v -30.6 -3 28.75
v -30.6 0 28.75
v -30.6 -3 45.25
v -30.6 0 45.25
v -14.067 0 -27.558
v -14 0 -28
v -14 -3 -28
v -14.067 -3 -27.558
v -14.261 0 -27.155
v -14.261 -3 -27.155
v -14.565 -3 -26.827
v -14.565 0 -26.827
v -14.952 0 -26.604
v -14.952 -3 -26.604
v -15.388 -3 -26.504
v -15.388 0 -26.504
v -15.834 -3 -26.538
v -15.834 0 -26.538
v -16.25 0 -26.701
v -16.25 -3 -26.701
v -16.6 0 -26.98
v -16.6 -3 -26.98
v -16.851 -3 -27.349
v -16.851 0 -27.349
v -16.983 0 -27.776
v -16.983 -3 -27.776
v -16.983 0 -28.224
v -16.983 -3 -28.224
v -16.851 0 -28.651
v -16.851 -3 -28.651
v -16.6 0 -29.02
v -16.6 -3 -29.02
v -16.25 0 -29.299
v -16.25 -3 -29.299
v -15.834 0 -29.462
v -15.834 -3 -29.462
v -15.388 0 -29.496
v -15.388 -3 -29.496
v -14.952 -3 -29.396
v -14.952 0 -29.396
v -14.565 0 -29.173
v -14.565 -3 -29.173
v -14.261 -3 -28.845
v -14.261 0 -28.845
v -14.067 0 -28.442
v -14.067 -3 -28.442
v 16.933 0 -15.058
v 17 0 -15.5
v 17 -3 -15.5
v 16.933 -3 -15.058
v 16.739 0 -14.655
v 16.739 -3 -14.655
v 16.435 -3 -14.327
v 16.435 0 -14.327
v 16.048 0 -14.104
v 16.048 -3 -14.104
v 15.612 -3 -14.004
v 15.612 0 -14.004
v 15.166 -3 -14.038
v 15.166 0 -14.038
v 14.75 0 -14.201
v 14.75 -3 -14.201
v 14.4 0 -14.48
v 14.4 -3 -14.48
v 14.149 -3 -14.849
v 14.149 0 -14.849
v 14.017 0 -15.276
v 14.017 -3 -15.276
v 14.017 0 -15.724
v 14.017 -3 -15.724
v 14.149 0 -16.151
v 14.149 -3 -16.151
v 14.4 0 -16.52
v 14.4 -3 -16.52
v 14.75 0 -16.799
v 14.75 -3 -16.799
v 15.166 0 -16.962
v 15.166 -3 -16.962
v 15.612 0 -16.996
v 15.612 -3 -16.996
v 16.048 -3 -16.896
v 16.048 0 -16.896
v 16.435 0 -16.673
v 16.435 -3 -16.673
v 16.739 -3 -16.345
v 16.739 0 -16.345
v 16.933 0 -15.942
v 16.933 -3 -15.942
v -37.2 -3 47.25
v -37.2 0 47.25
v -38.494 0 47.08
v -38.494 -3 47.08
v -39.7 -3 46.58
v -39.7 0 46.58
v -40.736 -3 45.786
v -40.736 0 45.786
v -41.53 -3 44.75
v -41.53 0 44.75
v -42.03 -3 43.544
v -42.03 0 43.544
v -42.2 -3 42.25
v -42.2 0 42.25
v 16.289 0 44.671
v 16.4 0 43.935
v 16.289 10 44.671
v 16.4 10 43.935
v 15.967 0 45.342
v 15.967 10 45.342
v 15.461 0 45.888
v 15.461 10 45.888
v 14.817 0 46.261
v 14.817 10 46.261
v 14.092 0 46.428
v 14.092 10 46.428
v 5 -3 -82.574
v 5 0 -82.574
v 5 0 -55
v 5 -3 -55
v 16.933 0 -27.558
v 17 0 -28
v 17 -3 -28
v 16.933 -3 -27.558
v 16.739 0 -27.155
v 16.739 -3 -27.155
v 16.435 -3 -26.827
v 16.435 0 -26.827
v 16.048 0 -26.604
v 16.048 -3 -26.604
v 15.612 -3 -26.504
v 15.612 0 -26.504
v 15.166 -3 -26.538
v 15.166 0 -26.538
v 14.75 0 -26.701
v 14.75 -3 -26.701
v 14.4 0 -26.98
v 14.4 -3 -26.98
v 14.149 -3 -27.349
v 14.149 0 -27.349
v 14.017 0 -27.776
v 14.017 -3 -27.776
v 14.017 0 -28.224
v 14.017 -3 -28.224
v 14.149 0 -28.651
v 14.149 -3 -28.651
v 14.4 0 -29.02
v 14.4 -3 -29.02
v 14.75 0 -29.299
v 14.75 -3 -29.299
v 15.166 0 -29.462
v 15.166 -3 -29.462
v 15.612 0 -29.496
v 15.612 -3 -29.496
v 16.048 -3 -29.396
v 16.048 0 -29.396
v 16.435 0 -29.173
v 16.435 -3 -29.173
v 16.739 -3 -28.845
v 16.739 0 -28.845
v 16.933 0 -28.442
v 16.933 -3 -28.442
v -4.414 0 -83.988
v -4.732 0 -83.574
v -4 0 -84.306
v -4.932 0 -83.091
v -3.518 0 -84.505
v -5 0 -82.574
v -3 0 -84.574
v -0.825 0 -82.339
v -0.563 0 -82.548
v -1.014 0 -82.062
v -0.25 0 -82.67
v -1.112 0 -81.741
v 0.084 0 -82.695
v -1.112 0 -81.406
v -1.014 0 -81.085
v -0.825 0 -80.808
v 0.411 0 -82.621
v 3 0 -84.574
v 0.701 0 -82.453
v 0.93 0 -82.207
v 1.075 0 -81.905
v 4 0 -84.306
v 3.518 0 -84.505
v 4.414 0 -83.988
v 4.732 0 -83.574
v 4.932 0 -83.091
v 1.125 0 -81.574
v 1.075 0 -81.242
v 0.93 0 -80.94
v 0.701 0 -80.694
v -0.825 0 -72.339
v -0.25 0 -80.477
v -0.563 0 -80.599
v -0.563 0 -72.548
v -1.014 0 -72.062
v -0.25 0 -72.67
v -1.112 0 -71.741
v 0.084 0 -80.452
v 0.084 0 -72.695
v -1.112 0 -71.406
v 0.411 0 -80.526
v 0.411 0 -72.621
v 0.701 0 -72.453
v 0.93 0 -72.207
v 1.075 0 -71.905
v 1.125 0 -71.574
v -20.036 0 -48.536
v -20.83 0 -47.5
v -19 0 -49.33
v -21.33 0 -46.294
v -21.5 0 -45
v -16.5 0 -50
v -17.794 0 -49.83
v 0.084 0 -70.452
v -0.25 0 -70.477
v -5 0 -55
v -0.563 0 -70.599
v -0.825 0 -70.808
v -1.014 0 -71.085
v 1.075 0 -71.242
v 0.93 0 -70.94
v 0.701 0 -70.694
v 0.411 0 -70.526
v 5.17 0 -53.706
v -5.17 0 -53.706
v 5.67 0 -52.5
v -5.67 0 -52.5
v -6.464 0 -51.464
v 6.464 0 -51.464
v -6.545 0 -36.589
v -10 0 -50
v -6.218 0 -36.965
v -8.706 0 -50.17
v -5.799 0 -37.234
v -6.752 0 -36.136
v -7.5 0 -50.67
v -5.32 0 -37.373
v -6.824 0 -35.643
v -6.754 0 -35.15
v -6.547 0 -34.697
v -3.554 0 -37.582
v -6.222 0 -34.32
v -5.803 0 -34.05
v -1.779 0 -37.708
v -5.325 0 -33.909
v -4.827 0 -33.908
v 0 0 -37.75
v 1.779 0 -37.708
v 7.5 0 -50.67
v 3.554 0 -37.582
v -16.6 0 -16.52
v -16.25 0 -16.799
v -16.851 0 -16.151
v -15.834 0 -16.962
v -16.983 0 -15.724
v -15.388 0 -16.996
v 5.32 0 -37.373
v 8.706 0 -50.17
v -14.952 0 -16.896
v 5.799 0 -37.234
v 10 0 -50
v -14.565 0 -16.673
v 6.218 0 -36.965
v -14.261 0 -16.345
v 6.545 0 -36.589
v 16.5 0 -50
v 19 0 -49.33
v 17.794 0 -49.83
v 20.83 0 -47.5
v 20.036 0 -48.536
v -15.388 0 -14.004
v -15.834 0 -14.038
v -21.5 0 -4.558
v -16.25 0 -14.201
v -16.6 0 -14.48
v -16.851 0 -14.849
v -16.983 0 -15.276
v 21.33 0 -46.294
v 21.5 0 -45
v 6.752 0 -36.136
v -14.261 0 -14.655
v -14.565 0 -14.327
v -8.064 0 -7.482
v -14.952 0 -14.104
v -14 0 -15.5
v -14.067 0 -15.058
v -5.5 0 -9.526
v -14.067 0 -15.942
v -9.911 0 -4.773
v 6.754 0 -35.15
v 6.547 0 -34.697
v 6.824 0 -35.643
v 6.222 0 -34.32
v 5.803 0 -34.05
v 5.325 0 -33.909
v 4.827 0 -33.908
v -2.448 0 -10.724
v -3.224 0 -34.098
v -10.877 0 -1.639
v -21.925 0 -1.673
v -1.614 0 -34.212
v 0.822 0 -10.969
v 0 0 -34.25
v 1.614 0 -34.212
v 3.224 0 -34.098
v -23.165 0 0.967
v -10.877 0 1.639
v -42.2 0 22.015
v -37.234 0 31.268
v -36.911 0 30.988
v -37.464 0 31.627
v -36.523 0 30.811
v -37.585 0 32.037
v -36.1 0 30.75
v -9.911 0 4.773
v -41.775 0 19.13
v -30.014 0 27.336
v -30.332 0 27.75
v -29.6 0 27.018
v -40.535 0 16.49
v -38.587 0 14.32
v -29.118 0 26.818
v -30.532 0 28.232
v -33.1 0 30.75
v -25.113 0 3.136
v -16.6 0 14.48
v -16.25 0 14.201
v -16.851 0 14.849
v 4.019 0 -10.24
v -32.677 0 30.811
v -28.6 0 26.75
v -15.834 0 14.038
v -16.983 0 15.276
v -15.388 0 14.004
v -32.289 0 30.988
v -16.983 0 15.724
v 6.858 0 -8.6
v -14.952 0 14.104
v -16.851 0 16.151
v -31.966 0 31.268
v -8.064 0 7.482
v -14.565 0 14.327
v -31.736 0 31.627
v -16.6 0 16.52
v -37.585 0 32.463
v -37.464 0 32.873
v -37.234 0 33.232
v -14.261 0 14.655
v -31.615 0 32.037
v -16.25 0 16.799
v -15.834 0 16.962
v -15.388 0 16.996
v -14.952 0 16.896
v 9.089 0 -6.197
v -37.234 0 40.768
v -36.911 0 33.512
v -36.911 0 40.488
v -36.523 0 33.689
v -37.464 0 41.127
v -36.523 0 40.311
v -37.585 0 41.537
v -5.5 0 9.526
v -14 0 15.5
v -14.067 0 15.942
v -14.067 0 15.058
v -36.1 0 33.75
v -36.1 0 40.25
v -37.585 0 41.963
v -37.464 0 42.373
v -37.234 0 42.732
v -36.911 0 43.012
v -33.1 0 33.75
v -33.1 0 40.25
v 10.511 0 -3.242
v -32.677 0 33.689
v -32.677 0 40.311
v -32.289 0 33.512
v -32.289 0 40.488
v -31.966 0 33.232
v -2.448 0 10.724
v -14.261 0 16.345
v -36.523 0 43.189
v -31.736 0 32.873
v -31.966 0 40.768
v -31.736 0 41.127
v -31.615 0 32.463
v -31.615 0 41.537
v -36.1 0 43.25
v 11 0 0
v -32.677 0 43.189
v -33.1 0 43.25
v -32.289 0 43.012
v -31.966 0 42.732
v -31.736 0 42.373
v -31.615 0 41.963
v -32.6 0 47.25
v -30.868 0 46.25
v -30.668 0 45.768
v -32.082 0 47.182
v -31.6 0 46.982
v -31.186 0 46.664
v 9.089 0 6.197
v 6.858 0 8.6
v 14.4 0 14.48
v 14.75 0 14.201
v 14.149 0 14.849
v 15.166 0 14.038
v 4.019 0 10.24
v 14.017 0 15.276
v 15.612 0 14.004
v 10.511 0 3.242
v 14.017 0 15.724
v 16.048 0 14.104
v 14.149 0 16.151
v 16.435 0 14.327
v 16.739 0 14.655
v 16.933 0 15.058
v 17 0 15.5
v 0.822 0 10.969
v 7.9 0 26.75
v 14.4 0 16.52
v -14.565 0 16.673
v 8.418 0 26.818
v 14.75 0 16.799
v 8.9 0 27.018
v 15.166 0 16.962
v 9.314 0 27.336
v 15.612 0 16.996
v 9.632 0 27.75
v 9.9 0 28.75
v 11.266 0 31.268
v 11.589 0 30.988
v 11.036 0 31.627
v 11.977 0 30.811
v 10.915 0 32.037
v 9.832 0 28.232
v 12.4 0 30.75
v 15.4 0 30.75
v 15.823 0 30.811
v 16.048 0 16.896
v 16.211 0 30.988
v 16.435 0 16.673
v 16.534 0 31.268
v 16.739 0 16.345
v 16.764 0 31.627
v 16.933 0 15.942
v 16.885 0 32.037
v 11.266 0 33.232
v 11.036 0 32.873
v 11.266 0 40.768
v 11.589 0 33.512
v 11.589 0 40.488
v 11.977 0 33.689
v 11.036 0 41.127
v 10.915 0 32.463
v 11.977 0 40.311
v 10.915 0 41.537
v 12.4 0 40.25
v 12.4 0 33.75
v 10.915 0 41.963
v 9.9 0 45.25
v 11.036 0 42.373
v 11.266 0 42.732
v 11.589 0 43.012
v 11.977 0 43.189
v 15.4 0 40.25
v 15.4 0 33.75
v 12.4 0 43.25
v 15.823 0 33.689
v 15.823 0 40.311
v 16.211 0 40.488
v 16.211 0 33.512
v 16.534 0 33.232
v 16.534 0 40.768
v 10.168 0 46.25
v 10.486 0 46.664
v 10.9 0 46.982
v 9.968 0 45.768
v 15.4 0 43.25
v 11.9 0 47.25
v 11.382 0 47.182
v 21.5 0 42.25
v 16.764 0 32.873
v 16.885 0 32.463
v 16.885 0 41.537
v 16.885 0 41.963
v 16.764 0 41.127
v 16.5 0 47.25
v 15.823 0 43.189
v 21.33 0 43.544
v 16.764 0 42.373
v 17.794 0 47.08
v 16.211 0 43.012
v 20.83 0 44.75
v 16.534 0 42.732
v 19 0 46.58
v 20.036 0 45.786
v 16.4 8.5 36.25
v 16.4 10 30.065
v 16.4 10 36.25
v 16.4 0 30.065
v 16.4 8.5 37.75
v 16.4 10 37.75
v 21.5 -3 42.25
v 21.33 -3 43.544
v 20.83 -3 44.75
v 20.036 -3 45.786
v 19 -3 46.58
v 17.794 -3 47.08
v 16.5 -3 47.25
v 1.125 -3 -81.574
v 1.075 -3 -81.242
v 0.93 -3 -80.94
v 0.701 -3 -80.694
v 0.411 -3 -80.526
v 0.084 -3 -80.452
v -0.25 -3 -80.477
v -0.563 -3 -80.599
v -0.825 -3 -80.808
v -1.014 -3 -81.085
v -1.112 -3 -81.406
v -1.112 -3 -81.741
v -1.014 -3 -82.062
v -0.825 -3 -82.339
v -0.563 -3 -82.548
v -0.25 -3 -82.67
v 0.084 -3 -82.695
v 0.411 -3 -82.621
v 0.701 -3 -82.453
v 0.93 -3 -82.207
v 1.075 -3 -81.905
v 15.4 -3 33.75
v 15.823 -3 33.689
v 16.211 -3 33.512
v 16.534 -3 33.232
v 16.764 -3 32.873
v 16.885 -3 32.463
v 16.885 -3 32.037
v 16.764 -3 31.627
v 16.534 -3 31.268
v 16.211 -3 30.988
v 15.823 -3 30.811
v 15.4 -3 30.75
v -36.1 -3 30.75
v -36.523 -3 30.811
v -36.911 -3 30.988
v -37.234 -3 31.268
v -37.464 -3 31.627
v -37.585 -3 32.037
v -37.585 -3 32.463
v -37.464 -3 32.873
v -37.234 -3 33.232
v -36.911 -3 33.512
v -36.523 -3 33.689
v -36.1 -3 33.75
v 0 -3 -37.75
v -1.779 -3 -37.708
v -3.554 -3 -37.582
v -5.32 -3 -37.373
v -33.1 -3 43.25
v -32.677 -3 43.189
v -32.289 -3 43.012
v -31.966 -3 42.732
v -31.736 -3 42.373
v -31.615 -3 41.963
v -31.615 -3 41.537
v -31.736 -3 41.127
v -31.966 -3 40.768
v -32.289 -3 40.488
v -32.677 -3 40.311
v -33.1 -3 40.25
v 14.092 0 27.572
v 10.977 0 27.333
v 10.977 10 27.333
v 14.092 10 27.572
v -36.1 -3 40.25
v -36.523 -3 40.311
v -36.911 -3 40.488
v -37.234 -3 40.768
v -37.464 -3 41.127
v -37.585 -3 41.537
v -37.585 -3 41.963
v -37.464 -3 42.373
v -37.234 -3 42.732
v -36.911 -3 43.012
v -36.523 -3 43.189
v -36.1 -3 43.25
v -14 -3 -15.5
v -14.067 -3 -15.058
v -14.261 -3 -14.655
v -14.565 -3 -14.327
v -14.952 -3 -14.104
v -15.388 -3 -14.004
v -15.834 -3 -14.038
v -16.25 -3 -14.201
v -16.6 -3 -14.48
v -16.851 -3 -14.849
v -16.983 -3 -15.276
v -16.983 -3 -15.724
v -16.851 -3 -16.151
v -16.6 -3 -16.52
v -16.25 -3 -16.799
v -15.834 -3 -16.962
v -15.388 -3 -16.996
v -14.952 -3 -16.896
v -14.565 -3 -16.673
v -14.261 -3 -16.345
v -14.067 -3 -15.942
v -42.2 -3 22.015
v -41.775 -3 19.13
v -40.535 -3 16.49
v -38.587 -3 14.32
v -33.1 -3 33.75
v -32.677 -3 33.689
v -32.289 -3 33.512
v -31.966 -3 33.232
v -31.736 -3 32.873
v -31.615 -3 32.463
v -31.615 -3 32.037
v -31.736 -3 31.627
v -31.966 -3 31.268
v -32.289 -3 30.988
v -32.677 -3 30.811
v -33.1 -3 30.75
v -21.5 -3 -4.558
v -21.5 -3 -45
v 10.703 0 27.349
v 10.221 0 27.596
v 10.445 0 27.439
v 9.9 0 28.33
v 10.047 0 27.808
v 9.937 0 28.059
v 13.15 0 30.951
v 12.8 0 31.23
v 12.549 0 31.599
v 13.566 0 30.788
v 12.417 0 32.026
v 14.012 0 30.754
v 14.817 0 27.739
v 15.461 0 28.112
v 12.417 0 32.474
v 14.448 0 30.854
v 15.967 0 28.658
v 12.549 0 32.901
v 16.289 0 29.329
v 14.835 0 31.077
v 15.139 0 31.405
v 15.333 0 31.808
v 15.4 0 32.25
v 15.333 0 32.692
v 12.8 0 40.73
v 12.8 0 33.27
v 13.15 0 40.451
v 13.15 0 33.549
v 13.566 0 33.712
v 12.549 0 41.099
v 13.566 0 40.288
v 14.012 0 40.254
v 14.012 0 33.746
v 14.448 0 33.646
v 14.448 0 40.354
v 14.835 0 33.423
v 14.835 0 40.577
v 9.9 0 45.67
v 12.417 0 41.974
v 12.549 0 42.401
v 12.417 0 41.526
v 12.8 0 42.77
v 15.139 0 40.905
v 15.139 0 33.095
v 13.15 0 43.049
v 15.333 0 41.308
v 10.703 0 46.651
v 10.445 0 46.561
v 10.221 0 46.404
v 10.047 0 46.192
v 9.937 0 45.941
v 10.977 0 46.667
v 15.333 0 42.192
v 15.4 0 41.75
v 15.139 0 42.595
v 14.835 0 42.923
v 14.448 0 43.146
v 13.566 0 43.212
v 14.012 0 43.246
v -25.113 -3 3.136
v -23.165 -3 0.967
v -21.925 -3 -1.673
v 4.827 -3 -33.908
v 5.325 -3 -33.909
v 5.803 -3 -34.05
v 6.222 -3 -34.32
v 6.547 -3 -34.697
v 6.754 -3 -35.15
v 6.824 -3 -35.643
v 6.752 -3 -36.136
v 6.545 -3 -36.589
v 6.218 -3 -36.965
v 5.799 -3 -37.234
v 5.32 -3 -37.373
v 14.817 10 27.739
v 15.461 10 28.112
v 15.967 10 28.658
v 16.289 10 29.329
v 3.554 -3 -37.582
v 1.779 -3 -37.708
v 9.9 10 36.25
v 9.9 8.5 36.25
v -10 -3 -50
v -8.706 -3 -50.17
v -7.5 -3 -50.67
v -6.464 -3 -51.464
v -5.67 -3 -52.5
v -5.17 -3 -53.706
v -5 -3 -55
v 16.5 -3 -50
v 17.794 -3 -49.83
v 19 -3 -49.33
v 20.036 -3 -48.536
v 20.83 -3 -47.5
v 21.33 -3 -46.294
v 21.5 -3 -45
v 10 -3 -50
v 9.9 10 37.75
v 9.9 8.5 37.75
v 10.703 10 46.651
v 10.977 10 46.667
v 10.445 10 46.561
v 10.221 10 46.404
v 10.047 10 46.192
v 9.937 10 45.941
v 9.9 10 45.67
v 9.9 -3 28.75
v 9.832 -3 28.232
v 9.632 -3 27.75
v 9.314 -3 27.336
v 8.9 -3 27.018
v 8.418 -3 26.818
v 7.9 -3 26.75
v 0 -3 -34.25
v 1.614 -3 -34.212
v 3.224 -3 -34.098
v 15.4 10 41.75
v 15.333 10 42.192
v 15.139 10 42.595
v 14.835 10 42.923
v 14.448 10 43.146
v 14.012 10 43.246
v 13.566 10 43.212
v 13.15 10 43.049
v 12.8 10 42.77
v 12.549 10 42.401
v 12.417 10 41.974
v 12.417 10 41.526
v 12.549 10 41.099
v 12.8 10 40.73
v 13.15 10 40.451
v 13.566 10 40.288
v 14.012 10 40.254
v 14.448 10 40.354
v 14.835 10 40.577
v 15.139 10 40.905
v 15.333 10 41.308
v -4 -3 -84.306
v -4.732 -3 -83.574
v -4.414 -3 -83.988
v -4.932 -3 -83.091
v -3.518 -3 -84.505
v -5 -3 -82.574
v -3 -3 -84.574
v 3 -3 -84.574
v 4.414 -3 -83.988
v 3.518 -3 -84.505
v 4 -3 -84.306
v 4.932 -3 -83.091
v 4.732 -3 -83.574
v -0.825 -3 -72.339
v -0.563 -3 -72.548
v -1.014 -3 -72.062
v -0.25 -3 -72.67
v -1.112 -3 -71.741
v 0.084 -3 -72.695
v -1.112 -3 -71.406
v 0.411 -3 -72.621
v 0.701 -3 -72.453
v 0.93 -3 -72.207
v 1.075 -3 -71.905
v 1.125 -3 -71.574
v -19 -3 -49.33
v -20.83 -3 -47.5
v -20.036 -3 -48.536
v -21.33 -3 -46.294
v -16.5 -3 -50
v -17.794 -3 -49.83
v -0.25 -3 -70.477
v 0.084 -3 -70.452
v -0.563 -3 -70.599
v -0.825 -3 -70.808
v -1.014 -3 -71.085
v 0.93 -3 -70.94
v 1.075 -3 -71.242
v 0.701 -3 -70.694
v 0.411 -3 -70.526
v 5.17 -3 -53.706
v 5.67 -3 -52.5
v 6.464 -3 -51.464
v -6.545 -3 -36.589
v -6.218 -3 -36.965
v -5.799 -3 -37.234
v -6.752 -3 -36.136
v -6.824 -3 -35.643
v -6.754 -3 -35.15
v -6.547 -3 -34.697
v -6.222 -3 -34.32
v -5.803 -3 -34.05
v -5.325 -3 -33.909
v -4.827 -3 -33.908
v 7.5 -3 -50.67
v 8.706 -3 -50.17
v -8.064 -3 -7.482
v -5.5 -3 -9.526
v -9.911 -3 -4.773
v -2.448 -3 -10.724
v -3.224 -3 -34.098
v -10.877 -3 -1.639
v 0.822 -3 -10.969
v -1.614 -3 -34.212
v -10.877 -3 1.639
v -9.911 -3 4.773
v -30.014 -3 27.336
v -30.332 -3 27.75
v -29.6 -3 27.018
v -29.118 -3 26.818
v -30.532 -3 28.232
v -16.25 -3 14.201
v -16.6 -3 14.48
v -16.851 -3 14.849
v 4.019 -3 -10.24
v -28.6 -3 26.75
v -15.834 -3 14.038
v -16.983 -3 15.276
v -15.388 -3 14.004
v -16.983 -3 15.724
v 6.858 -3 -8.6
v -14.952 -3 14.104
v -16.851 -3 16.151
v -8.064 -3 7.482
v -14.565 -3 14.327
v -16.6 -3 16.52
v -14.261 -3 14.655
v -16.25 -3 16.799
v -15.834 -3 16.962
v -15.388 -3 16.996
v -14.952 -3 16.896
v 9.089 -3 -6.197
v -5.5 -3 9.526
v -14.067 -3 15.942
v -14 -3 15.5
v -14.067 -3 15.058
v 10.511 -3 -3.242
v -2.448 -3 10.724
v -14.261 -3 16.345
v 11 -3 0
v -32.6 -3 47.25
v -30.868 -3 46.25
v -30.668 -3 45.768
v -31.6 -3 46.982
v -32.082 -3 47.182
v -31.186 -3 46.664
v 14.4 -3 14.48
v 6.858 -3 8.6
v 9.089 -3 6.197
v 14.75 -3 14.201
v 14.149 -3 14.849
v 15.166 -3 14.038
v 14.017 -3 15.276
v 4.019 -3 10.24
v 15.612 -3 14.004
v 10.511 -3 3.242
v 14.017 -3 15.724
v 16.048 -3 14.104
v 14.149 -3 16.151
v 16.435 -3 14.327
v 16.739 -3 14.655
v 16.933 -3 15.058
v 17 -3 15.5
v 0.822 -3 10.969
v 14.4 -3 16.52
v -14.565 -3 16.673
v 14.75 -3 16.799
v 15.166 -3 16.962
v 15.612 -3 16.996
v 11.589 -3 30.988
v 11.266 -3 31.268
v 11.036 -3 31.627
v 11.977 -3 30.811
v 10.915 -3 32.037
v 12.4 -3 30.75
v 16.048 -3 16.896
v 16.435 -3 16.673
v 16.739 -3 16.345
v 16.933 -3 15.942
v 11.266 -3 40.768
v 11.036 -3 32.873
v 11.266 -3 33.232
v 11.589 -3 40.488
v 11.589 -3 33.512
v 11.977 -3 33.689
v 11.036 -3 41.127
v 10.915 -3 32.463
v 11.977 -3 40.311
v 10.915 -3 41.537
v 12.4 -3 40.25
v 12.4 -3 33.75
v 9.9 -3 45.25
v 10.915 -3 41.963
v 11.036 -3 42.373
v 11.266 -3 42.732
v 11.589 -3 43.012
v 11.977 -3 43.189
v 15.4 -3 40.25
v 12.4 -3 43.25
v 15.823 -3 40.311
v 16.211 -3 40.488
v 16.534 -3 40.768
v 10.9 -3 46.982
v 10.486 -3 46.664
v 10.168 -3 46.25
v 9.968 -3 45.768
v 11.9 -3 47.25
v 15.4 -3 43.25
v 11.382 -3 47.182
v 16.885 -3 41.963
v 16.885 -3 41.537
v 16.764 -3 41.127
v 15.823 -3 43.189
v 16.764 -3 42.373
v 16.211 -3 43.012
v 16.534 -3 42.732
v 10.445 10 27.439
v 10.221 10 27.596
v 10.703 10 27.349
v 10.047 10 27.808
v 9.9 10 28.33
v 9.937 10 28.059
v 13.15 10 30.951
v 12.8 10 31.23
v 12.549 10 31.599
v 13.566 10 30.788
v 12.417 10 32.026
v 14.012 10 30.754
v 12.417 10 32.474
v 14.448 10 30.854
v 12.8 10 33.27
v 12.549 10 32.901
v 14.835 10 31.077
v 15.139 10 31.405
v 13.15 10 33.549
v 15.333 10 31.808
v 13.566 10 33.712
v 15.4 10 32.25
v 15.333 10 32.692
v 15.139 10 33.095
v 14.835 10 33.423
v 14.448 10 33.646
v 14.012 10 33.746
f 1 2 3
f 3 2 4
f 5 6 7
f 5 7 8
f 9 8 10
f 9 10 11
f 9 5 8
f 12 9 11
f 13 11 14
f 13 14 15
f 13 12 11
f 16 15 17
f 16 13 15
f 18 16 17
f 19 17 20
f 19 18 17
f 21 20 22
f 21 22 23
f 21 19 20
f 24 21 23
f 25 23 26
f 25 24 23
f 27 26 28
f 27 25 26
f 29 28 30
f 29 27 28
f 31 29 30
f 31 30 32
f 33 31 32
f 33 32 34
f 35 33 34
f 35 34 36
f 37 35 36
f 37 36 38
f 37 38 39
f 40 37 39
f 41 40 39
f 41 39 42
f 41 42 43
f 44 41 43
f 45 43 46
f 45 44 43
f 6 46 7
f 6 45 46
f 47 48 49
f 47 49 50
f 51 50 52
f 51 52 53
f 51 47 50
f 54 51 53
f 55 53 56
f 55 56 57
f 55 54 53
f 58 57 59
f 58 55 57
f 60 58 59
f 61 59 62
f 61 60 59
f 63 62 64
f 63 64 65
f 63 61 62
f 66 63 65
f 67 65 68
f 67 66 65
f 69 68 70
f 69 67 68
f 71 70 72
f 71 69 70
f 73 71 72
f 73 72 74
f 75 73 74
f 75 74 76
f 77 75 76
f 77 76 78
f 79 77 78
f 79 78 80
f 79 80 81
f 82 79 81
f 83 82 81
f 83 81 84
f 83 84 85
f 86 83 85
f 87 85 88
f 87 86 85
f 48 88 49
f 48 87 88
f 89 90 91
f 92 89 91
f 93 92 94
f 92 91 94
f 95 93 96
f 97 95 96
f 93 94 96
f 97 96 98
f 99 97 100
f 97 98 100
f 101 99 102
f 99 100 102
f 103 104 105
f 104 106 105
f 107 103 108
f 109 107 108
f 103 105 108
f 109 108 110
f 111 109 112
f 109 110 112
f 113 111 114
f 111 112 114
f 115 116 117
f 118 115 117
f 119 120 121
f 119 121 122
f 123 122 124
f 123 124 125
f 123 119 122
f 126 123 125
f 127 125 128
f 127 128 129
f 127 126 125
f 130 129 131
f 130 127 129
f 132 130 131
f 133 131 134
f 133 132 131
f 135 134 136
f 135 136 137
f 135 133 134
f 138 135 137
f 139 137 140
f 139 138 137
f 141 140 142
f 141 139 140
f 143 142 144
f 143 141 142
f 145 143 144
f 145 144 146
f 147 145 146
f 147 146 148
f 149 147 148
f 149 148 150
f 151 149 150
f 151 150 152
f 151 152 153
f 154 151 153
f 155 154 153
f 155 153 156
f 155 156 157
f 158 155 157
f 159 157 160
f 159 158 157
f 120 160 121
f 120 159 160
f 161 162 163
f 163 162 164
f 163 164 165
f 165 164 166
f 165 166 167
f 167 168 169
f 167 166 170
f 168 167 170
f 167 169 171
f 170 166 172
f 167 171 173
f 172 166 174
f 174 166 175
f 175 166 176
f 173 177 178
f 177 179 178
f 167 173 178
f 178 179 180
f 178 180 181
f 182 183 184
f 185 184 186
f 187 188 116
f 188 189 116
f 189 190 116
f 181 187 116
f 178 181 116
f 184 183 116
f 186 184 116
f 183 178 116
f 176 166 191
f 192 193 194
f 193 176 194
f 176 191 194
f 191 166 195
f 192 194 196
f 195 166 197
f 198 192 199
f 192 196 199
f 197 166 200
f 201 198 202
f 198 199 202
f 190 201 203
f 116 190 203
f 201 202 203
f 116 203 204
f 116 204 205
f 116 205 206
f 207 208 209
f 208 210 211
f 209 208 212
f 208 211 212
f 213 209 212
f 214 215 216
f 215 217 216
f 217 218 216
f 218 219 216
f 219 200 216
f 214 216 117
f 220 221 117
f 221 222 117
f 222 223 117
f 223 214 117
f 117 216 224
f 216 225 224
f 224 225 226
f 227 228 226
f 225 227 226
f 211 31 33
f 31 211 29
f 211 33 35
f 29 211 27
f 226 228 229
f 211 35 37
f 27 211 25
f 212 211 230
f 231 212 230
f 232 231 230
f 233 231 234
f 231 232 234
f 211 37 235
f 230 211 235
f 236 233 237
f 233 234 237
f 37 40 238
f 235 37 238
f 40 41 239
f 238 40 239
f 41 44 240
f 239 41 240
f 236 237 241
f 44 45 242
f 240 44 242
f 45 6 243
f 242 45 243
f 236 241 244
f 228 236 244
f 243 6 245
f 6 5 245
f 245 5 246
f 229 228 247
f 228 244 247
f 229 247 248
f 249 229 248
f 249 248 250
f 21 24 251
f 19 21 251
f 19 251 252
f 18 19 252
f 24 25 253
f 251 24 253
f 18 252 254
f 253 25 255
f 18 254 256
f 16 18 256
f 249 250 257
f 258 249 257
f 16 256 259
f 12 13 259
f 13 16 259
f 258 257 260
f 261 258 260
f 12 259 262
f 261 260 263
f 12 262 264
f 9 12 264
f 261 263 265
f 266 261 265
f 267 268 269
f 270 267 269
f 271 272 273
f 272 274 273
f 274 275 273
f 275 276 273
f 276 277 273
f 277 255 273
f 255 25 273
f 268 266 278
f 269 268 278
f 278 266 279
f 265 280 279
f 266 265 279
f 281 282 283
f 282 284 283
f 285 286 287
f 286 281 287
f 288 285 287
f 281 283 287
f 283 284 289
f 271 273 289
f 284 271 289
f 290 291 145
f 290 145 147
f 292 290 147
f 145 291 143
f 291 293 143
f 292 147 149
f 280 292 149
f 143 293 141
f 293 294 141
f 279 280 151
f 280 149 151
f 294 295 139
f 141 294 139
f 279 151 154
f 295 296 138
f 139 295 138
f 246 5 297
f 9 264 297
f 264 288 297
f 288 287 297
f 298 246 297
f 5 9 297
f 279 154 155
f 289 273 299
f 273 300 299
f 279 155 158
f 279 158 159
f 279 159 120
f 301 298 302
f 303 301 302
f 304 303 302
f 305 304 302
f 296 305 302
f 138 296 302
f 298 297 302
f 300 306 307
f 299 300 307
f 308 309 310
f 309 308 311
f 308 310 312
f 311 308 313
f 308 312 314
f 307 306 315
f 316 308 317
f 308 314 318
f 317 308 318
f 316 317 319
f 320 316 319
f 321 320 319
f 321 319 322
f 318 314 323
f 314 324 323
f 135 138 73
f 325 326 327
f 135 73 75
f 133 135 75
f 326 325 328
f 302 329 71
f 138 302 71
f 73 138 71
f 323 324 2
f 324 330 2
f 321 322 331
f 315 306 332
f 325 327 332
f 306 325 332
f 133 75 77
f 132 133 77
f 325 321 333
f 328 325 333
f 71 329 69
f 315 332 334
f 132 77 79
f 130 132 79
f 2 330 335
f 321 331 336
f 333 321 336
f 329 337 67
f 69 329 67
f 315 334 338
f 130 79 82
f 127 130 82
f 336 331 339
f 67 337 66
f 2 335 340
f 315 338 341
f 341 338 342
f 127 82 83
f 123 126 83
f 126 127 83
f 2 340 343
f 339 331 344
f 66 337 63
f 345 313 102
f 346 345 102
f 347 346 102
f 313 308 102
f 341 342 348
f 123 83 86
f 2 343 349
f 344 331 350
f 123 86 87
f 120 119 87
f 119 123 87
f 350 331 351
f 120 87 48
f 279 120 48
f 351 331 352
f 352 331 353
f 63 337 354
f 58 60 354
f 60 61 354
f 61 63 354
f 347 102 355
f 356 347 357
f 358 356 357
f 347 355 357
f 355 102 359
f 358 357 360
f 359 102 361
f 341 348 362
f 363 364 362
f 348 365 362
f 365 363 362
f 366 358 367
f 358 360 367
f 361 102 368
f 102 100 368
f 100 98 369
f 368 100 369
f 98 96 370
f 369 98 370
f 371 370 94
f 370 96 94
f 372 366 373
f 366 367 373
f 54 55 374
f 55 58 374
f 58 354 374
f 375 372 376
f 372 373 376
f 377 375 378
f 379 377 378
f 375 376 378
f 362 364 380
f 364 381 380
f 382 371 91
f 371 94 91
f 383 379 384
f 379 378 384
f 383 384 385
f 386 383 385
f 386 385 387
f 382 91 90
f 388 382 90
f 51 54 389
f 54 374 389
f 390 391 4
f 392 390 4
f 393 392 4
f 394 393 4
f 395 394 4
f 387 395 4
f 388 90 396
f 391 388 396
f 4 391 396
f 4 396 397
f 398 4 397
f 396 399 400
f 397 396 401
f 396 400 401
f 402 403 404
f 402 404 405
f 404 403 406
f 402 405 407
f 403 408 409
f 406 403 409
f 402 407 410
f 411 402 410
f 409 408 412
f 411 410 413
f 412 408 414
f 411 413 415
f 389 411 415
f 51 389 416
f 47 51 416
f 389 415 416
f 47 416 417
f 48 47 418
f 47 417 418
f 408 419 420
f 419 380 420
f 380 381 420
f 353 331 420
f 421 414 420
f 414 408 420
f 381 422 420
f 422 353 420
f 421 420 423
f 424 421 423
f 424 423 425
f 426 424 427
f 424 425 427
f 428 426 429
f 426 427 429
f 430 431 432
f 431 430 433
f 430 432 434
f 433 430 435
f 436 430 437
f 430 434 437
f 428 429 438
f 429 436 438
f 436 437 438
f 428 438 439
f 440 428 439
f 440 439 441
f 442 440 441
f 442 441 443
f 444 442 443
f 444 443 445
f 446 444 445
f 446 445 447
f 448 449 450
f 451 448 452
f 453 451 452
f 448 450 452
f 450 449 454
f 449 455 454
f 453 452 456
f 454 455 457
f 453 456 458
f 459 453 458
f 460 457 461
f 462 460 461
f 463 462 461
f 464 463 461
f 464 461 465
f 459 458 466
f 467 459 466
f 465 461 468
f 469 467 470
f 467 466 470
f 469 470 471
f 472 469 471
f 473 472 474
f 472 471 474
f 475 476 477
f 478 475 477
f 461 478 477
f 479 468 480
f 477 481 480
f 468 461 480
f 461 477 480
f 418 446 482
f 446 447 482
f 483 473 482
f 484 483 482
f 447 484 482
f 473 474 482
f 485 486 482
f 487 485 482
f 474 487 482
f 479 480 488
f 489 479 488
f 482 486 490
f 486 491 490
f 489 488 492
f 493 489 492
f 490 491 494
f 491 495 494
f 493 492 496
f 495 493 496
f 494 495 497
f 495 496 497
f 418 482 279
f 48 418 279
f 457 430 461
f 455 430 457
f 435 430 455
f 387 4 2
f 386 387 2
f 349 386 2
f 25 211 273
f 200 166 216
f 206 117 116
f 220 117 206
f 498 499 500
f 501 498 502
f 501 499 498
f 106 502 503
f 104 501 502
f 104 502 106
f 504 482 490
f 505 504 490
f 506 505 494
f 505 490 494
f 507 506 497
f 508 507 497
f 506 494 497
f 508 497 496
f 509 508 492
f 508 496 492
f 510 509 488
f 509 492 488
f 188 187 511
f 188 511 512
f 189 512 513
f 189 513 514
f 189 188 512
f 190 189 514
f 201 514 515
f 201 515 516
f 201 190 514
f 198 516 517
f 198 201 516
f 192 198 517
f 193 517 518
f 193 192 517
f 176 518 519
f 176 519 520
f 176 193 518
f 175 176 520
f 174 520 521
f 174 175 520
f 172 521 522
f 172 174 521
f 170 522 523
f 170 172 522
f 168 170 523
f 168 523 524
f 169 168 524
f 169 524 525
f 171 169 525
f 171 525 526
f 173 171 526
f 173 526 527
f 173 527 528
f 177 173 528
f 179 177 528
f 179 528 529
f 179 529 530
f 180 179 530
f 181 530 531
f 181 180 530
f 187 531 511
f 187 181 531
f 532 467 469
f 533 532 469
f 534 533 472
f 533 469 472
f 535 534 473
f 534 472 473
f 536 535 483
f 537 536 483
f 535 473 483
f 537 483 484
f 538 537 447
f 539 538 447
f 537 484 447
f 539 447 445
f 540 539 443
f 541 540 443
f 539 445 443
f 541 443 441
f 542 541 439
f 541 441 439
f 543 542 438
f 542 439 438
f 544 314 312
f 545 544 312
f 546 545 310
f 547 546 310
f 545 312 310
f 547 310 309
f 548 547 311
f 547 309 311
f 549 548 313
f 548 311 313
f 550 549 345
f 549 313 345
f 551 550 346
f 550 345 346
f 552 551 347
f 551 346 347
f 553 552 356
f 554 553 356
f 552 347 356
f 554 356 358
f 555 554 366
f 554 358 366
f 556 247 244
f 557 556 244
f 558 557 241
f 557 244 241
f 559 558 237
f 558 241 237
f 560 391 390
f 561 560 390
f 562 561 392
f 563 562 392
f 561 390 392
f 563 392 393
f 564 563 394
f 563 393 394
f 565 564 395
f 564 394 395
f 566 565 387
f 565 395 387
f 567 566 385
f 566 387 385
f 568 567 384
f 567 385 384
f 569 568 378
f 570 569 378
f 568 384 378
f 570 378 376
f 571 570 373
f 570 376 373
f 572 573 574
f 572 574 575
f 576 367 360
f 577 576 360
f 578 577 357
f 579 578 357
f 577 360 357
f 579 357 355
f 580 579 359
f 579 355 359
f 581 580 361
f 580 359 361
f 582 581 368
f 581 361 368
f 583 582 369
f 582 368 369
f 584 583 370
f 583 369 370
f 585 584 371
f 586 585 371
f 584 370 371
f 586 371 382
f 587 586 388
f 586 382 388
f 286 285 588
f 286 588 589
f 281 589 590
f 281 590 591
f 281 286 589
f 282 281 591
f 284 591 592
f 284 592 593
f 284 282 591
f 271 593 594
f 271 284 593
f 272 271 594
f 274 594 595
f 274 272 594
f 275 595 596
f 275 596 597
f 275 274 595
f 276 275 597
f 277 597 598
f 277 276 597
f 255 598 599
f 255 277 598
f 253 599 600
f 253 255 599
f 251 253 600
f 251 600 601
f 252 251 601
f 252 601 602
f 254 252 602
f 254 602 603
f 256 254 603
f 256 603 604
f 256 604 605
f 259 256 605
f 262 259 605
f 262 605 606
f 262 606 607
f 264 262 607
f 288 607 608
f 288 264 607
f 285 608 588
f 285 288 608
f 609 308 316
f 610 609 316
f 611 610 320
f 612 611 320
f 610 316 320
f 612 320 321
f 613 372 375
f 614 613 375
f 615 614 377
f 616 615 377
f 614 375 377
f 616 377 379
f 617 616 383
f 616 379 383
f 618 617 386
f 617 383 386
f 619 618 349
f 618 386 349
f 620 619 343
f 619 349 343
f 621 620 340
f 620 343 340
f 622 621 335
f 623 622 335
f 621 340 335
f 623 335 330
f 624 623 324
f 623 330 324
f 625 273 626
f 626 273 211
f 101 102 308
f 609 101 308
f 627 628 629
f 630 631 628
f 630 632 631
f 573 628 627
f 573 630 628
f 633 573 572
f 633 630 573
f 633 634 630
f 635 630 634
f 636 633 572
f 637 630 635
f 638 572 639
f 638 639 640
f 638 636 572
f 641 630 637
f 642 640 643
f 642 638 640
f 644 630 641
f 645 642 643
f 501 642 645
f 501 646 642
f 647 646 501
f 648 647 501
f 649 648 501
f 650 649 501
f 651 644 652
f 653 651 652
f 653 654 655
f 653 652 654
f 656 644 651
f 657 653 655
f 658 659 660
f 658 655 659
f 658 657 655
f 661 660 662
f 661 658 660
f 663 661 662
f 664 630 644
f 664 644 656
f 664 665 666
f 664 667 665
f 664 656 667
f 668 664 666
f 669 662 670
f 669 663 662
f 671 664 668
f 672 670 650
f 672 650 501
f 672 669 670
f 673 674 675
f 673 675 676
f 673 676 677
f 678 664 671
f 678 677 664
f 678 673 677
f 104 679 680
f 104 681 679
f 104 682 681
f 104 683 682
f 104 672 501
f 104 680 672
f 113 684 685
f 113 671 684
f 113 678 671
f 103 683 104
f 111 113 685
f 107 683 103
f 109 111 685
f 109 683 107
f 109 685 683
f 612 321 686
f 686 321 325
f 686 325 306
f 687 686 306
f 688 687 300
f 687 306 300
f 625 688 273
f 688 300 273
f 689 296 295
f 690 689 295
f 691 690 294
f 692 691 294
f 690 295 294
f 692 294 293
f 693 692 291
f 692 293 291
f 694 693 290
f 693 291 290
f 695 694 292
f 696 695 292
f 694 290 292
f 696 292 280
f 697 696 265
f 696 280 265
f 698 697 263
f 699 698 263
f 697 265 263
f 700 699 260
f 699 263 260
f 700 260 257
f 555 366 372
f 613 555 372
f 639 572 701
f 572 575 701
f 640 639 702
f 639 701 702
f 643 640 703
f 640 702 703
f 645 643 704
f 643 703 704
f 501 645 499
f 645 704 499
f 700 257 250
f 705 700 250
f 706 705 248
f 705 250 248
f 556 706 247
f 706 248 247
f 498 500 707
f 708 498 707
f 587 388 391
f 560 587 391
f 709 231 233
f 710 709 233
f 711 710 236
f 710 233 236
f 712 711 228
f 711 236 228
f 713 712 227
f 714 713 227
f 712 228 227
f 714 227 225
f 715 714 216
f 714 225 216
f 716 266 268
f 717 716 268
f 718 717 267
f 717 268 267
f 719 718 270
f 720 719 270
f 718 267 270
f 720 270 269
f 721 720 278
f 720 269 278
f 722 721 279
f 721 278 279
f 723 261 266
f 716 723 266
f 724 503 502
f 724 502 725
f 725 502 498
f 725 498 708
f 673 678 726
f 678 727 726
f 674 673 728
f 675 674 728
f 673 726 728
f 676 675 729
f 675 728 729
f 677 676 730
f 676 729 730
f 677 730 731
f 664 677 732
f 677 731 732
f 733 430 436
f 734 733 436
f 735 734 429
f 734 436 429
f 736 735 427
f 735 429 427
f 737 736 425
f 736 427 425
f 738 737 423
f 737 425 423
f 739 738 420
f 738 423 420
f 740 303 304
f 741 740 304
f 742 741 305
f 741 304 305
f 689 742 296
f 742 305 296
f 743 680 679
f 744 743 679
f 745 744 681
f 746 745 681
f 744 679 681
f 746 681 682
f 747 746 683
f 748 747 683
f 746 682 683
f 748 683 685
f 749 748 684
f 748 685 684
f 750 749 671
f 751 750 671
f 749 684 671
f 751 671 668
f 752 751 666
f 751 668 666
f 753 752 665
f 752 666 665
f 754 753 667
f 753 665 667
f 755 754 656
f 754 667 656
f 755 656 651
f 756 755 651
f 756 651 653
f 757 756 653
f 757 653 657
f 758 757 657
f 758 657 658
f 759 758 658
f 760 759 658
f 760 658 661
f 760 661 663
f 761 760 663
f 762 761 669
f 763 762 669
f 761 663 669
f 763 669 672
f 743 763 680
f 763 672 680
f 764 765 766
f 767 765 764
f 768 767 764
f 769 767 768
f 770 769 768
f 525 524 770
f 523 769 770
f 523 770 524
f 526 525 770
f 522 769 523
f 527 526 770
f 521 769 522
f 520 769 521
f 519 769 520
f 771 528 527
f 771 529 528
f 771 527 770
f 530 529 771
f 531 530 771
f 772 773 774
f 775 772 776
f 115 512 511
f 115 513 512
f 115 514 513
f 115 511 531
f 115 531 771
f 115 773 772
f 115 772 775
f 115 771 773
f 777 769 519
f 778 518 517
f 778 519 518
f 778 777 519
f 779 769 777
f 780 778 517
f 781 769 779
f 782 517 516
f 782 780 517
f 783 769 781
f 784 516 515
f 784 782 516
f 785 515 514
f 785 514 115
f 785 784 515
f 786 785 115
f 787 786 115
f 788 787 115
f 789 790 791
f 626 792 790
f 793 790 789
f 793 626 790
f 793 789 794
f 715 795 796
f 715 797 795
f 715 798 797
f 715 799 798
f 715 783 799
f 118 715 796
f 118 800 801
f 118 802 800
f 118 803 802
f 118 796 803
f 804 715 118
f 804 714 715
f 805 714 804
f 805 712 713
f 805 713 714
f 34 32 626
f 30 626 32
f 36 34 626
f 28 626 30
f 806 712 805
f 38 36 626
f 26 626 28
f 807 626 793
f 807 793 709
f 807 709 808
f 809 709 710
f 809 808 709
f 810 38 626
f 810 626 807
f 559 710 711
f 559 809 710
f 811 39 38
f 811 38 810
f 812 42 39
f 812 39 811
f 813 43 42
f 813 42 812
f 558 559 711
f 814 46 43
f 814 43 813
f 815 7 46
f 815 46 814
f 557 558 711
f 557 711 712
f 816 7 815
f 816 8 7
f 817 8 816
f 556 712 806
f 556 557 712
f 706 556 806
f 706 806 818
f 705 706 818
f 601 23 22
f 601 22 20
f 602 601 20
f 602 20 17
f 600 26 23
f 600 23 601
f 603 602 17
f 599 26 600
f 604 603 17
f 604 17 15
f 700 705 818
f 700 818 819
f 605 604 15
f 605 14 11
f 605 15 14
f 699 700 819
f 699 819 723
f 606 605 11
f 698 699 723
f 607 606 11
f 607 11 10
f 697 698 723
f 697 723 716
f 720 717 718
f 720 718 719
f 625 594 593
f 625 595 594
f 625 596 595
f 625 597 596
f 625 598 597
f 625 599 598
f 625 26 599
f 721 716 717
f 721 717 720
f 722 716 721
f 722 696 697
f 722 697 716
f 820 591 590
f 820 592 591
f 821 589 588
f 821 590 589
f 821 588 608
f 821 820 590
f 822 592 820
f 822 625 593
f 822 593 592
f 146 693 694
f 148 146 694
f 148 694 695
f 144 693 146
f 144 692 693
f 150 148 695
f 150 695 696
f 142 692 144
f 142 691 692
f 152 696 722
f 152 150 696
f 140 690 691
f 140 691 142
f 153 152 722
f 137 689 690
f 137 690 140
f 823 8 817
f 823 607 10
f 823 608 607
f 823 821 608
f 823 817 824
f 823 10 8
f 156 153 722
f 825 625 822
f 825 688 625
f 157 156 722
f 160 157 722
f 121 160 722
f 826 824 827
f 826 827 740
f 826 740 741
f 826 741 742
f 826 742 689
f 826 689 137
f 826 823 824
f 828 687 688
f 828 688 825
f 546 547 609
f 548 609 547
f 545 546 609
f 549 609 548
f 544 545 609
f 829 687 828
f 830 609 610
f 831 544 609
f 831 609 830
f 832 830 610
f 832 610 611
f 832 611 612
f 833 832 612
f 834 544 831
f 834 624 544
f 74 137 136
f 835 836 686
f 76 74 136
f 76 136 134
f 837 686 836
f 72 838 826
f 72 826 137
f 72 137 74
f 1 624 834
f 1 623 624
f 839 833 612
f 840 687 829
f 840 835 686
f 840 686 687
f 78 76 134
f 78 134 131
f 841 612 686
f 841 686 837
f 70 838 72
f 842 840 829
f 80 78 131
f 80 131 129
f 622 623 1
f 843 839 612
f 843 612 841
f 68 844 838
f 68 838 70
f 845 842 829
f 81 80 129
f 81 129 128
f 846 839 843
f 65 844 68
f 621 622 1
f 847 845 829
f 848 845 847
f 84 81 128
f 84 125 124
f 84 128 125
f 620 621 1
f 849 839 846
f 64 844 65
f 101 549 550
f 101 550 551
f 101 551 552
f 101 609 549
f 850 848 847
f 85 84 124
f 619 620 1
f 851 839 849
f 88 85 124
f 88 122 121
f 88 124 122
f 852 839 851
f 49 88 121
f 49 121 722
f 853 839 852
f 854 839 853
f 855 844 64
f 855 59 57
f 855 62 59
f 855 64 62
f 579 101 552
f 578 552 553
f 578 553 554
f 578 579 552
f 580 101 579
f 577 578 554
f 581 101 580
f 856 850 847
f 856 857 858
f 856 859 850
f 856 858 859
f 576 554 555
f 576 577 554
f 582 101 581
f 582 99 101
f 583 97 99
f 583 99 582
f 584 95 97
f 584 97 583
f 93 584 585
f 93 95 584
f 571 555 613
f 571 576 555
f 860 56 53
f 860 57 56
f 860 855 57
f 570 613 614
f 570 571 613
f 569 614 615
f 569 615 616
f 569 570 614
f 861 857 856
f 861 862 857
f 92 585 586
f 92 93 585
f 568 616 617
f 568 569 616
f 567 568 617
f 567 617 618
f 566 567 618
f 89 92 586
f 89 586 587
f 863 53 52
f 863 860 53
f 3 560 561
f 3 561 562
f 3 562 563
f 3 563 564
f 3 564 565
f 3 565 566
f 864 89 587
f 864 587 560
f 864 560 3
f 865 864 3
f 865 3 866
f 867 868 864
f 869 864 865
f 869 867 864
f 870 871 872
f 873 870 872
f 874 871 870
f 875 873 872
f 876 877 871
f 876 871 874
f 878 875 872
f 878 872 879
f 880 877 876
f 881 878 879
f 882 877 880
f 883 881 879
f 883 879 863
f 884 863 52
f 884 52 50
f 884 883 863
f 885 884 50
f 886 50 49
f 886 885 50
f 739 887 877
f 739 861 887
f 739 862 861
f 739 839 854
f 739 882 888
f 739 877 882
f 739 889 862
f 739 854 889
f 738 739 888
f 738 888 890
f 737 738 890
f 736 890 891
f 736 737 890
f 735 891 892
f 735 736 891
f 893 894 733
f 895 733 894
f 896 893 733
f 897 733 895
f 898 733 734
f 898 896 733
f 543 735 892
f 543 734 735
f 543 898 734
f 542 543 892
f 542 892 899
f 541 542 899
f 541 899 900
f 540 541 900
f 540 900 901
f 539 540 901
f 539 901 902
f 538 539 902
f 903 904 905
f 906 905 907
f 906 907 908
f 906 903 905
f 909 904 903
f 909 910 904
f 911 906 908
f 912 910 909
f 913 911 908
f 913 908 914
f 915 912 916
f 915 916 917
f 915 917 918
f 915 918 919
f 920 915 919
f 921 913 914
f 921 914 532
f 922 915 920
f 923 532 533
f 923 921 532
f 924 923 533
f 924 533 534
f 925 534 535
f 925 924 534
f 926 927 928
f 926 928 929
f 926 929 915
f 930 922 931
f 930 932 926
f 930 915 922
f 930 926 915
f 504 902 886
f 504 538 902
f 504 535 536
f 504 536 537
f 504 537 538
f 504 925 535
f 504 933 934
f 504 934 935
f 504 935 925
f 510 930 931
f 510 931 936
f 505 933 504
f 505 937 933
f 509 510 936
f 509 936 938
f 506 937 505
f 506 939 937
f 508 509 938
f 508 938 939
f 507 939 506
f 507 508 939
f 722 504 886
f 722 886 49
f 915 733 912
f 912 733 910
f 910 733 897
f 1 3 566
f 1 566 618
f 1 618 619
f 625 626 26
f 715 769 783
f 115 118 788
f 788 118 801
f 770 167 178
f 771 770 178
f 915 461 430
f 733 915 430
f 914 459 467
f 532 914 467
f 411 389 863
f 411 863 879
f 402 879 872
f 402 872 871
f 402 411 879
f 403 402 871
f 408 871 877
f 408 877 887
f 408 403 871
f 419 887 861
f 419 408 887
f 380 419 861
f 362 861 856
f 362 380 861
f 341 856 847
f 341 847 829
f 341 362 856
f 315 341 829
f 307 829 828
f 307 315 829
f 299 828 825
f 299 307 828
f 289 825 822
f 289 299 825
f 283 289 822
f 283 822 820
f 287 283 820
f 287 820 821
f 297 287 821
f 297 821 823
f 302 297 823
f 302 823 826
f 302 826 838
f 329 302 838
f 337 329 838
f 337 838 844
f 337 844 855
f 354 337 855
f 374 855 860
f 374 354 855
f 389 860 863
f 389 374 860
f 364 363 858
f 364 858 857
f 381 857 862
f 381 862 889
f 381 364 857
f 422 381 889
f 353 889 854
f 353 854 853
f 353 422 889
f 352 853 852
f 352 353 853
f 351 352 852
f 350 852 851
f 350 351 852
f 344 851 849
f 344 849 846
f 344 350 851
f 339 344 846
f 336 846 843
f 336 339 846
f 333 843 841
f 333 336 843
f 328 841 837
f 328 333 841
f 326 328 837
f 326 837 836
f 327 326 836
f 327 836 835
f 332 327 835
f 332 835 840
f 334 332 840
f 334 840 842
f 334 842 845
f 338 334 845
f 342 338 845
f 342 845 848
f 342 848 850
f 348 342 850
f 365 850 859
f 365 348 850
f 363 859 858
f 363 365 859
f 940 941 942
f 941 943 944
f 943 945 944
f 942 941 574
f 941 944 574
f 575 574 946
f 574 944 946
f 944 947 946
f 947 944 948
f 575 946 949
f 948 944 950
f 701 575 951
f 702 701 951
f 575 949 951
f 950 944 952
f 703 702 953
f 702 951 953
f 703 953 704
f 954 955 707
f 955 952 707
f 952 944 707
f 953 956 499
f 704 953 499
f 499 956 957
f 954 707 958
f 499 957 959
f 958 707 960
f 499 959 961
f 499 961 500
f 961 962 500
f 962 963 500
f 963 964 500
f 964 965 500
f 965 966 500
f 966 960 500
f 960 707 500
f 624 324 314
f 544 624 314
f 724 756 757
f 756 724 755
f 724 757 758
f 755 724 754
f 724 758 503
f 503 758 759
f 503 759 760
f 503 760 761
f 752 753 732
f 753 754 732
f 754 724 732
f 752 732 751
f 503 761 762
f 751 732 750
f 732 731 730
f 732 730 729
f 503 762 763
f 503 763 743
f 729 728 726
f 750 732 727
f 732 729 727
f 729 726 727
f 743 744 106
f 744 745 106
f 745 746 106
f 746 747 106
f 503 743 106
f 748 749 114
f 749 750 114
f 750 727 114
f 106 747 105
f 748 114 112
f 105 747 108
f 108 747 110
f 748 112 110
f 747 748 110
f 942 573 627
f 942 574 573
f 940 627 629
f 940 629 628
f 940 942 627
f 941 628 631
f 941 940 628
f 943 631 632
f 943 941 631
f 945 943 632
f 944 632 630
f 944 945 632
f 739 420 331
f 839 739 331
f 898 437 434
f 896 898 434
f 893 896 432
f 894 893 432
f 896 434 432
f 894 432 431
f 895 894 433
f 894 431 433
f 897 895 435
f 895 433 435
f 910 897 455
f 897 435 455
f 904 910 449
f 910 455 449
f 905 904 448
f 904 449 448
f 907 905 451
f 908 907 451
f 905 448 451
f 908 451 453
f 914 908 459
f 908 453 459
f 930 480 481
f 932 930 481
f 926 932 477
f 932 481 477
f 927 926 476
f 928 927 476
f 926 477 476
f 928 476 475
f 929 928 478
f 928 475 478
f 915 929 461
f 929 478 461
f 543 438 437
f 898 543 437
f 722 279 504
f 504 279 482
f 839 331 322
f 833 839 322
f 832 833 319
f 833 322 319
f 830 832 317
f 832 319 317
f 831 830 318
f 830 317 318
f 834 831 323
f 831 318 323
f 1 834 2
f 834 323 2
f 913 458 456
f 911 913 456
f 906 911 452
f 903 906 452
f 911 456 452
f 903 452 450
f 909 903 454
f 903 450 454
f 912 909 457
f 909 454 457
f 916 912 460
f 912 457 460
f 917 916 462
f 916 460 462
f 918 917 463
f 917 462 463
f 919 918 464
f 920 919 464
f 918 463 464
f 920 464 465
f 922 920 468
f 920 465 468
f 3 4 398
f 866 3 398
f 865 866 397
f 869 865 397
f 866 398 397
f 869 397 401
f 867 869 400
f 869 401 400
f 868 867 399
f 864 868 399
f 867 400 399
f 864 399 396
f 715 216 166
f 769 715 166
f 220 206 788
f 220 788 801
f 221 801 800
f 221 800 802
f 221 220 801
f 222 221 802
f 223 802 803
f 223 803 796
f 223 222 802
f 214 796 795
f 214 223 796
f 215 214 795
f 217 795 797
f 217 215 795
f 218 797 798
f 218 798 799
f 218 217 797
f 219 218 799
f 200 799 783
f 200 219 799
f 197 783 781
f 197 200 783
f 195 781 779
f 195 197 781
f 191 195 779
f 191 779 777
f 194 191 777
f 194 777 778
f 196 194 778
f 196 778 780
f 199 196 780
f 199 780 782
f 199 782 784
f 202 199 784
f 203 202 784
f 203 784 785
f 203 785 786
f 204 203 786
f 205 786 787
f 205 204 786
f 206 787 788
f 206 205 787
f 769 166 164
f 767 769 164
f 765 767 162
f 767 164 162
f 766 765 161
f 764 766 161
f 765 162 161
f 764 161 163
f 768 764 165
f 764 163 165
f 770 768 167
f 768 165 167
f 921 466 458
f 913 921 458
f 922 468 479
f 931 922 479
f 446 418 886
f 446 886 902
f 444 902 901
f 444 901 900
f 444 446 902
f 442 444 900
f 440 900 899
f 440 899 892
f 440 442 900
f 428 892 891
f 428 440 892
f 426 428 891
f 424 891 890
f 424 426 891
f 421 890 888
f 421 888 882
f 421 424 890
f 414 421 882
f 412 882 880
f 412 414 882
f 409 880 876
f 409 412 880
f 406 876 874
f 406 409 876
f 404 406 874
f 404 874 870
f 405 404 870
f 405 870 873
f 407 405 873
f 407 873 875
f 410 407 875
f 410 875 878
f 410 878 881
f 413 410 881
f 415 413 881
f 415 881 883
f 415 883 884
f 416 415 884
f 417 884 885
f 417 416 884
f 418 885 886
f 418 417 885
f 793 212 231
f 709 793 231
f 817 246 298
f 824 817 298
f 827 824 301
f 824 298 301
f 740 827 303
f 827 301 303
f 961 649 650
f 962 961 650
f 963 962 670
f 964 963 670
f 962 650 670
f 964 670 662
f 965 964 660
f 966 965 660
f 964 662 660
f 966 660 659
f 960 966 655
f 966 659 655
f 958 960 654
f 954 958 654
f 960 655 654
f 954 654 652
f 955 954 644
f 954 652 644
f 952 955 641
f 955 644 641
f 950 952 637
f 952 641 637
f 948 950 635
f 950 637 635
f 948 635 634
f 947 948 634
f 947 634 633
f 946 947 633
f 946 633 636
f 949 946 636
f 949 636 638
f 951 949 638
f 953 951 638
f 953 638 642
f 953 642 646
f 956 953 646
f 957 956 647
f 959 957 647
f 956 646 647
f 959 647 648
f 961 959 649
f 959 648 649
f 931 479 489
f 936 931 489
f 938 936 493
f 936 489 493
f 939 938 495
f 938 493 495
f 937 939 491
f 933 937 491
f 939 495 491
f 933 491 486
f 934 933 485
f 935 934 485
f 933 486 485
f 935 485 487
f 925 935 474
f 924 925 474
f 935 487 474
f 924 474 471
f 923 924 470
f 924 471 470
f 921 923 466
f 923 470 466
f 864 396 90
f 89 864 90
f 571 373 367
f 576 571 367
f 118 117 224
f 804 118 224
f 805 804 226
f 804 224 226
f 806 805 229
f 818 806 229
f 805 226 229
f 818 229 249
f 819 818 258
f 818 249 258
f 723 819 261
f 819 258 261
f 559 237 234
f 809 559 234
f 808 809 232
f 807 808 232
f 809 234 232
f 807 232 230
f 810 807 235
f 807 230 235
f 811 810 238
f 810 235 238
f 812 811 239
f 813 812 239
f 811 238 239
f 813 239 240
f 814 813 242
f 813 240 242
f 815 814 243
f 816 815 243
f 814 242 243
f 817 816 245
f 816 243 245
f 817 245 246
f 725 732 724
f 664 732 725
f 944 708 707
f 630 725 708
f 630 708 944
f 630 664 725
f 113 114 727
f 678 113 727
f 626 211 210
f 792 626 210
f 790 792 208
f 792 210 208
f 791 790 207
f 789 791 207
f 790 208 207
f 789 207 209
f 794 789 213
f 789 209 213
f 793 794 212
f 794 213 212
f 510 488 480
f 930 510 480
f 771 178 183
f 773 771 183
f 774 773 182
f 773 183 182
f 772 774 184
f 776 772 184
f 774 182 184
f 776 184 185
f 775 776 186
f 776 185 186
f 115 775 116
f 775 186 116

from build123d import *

# Parameters (mm, degrees)
F1_R     = 1.5
F1_R_2   = 1.125
F1_R_3   = 11
F2_DEPTH = 3
F3_R     = 1.5
F4_DEPTH = 10
F5_W     = 6.5
F5_H     = 1.5
F6_DEPTH = 1.5
F7_R     = 1
F8_R     = 2.5


with BuildPart() as f2:
    # F1 (on Front) → F2 (new body)
    with BuildSketch(Plane.XZ):
        with BuildLine():
            ThreePointArc((16.5, -50), (20.035534, -48.535534), (21.5, -45))
            Line((21.5, -45), (21.5, 42.25))
            ThreePointArc((21.5, 42.25), (20.035534, 45.785534), (16.5, 47.25))
            Line((16.5, 47.25), (11.9, 47.25))
            ThreePointArc((11.9, 47.25), (10.485786, 46.664214), (9.9, 45.25))
            Line((9.9, 45.25), (9.9, 28.75))
            ThreePointArc((9.9, 28.75), (9.314214, 27.335786), (7.9, 26.75))
            Line((7.9, 26.75), (-28.6, 26.75))
            ThreePointArc((-28.6, 26.75), (-30.014214, 27.335786), (-30.6, 28.75))
            Line((-30.6, 28.75), (-30.6, 45.25))
            ThreePointArc((-30.6, 45.25), (-31.185786, 46.664214), (-32.6, 47.25))
            Line((-32.6, 47.25), (-37.2, 47.25))
            ThreePointArc((-37.2, 47.25), (-40.735534, 45.785534), (-42.2, 42.25))
            Line((-42.2, 42.25), (-42.2, 22.015033))
            ThreePointArc((-42.2, 22.015033), (-41.251777, 17.7647), (-38.586933, 14.320419))
            Line((-38.586933, 14.320419), (-25.113067, 3.136405))
            ThreePointArc((-25.113067, 3.136405), (-22.448223, -0.307876), (-21.5, -4.558209))
            Line((-21.5, -4.558209), (-21.5, -45))
            ThreePointArc((-21.5, -45), (-20.035534, -48.535534), (-16.5, -50))
            Line((-16.5, -50), (-10, -50))
            ThreePointArc((-10, -50), (-6.464466, -51.464466), (-5, -55))
            Line((-5, -55), (-5, -82.573619))
            ThreePointArc((-5, -82.573619), (-4.414214, -83.987833), (-3, -84.573619))
            Line((-3, -84.573619), (3, -84.573619))
            ThreePointArc((3, -84.573619), (4.414214, -83.987833), (5, -82.573619))
            Line((5, -82.573619), (5, -55))
            ThreePointArc((5, -55), (6.464466, -51.464466), (10, -50))
            Line((10, -50), (16.5, -50))
        make_face()
        with Locations((-15.5, -28)):
            Circle(F1_R, mode=Mode.SUBTRACT)
        with Locations((0, -81.573619)):
            Circle(F1_R_2, mode=Mode.SUBTRACT)
        with Locations((0, -71.573619)):
            Circle(F1_R_2, mode=Mode.SUBTRACT)
        with BuildLine():
            ThreePointArc((0, -34.25), (2.419604, -34.164426), (4.827117, -33.908132))
            ThreePointArc((4.827117, -33.908132), (6.80629, -35.394024), (5.320399, -37.373197))
            ThreePointArc((5.320399, -37.373197), (2.666863, -37.655681), (0, -37.75))
            ThreePointArc((0, -37.75), (-2.666863, -37.655681), (-5.320399, -37.373197))
            ThreePointArc((-5.320399, -37.373197), (-6.80629, -35.394024), (-4.827117, -33.908132))
            ThreePointArc((-4.827117, -33.908132), (-2.419604, -34.164426), (0, -34.25))
        make_face(mode=Mode.SUBTRACT)
        with Locations((15.5, -28)):
            Circle(F1_R, mode=Mode.SUBTRACT)
        with Locations((-15.5, -15.5)):
            Circle(F1_R, mode=Mode.SUBTRACT)
        with BuildLine():
            ThreePointArc((-36.1, 30.75), (-37.6, 32.25), (-36.1, 33.75))
            Line((-36.1, 33.75), (-33.1, 33.75))
            ThreePointArc((-33.1, 33.75), (-31.6, 32.25), (-33.1, 30.75))
            Line((-33.1, 30.75), (-36.1, 30.75))
        make_face(mode=Mode.SUBTRACT)
        with BuildLine():
            Line((-33.1, 40.25), (-36.1, 40.25))
            ThreePointArc((-36.1, 40.25), (-37.6, 41.75), (-36.1, 43.25))
            Line((-36.1, 43.25), (-33.1, 43.25))
            ThreePointArc((-33.1, 43.25), (-31.6, 41.75), (-33.1, 40.25))
        make_face(mode=Mode.SUBTRACT)
        with Locations((-15.5, 15.5)):
            Circle(F1_R, mode=Mode.SUBTRACT)
        Circle(F1_R_3, mode=Mode.SUBTRACT)
        with Locations((15.5, -15.5)):
            Circle(F1_R, mode=Mode.SUBTRACT)
        with Locations((15.5, 15.5)):
            Circle(F1_R, mode=Mode.SUBTRACT)
        with BuildLine():
            Line((15.4, 30.75), (12.4, 30.75))
            ThreePointArc((12.4, 30.75), (10.9, 32.25), (12.4, 33.75))
            Line((12.4, 33.75), (15.4, 33.75))
            ThreePointArc((15.4, 33.75), (16.9, 32.25), (15.4, 30.75))
        make_face(mode=Mode.SUBTRACT)
        with BuildLine():
            Line((15.4, 40.25), (12.4, 40.25))
            ThreePointArc((12.4, 40.25), (10.9, 41.75), (12.4, 43.25))
            Line((12.4, 43.25), (15.4, 43.25))
            ThreePointArc((15.4, 43.25), (16.9, 41.75), (15.4, 40.25))
        make_face(mode=Mode.SUBTRACT)
    extrude(amount=F2_DEPTH)


with BuildPart() as f4:
    # F3 (on Front) → F4 (new body)
    with BuildSketch(Plane.XZ):
        Polygon((16.4, 27.75), (16.4, 46.25), (9.9, 46.75), (9.9, 27.25), align=None)
        with Locations((13.9, 32.25)):
            Circle(F3_R, mode=Mode.SUBTRACT)
        with Locations((13.9, 41.75)):
            Circle(F3_R, mode=Mode.SUBTRACT)
    extrude(amount=-F4_DEPTH)

    # F5 (on face) → F6 (cut)
    with BuildSketch(Plane(origin=(0, 10, 0), x_dir=(-1, 0, 0), z_dir=(0, 1, 0))):
        with Locations((-13.15, 37)):
            Rectangle(F5_W, F5_H)
    extrude(amount=-F6_DEPTH, mode=Mode.SUBTRACT)

    # F7
    f7_edges = [f4.edges().sort_by_distance(p)[0] for p in [
        (9.9, 5, 46.75),
        (9.9, 5, 27.25),
    ]]
    fillet(f7_edges, radius=F7_R)

    # F8
    f8_edges = [f4.edges().sort_by_distance(p)[0] for p in [
        (16.4, 5, 27.75),
        (16.4, 5, 46.25),
    ]]
    fillet(f8_edges, radius=F8_R)


solid = Compound([f2.part, f4.part])
